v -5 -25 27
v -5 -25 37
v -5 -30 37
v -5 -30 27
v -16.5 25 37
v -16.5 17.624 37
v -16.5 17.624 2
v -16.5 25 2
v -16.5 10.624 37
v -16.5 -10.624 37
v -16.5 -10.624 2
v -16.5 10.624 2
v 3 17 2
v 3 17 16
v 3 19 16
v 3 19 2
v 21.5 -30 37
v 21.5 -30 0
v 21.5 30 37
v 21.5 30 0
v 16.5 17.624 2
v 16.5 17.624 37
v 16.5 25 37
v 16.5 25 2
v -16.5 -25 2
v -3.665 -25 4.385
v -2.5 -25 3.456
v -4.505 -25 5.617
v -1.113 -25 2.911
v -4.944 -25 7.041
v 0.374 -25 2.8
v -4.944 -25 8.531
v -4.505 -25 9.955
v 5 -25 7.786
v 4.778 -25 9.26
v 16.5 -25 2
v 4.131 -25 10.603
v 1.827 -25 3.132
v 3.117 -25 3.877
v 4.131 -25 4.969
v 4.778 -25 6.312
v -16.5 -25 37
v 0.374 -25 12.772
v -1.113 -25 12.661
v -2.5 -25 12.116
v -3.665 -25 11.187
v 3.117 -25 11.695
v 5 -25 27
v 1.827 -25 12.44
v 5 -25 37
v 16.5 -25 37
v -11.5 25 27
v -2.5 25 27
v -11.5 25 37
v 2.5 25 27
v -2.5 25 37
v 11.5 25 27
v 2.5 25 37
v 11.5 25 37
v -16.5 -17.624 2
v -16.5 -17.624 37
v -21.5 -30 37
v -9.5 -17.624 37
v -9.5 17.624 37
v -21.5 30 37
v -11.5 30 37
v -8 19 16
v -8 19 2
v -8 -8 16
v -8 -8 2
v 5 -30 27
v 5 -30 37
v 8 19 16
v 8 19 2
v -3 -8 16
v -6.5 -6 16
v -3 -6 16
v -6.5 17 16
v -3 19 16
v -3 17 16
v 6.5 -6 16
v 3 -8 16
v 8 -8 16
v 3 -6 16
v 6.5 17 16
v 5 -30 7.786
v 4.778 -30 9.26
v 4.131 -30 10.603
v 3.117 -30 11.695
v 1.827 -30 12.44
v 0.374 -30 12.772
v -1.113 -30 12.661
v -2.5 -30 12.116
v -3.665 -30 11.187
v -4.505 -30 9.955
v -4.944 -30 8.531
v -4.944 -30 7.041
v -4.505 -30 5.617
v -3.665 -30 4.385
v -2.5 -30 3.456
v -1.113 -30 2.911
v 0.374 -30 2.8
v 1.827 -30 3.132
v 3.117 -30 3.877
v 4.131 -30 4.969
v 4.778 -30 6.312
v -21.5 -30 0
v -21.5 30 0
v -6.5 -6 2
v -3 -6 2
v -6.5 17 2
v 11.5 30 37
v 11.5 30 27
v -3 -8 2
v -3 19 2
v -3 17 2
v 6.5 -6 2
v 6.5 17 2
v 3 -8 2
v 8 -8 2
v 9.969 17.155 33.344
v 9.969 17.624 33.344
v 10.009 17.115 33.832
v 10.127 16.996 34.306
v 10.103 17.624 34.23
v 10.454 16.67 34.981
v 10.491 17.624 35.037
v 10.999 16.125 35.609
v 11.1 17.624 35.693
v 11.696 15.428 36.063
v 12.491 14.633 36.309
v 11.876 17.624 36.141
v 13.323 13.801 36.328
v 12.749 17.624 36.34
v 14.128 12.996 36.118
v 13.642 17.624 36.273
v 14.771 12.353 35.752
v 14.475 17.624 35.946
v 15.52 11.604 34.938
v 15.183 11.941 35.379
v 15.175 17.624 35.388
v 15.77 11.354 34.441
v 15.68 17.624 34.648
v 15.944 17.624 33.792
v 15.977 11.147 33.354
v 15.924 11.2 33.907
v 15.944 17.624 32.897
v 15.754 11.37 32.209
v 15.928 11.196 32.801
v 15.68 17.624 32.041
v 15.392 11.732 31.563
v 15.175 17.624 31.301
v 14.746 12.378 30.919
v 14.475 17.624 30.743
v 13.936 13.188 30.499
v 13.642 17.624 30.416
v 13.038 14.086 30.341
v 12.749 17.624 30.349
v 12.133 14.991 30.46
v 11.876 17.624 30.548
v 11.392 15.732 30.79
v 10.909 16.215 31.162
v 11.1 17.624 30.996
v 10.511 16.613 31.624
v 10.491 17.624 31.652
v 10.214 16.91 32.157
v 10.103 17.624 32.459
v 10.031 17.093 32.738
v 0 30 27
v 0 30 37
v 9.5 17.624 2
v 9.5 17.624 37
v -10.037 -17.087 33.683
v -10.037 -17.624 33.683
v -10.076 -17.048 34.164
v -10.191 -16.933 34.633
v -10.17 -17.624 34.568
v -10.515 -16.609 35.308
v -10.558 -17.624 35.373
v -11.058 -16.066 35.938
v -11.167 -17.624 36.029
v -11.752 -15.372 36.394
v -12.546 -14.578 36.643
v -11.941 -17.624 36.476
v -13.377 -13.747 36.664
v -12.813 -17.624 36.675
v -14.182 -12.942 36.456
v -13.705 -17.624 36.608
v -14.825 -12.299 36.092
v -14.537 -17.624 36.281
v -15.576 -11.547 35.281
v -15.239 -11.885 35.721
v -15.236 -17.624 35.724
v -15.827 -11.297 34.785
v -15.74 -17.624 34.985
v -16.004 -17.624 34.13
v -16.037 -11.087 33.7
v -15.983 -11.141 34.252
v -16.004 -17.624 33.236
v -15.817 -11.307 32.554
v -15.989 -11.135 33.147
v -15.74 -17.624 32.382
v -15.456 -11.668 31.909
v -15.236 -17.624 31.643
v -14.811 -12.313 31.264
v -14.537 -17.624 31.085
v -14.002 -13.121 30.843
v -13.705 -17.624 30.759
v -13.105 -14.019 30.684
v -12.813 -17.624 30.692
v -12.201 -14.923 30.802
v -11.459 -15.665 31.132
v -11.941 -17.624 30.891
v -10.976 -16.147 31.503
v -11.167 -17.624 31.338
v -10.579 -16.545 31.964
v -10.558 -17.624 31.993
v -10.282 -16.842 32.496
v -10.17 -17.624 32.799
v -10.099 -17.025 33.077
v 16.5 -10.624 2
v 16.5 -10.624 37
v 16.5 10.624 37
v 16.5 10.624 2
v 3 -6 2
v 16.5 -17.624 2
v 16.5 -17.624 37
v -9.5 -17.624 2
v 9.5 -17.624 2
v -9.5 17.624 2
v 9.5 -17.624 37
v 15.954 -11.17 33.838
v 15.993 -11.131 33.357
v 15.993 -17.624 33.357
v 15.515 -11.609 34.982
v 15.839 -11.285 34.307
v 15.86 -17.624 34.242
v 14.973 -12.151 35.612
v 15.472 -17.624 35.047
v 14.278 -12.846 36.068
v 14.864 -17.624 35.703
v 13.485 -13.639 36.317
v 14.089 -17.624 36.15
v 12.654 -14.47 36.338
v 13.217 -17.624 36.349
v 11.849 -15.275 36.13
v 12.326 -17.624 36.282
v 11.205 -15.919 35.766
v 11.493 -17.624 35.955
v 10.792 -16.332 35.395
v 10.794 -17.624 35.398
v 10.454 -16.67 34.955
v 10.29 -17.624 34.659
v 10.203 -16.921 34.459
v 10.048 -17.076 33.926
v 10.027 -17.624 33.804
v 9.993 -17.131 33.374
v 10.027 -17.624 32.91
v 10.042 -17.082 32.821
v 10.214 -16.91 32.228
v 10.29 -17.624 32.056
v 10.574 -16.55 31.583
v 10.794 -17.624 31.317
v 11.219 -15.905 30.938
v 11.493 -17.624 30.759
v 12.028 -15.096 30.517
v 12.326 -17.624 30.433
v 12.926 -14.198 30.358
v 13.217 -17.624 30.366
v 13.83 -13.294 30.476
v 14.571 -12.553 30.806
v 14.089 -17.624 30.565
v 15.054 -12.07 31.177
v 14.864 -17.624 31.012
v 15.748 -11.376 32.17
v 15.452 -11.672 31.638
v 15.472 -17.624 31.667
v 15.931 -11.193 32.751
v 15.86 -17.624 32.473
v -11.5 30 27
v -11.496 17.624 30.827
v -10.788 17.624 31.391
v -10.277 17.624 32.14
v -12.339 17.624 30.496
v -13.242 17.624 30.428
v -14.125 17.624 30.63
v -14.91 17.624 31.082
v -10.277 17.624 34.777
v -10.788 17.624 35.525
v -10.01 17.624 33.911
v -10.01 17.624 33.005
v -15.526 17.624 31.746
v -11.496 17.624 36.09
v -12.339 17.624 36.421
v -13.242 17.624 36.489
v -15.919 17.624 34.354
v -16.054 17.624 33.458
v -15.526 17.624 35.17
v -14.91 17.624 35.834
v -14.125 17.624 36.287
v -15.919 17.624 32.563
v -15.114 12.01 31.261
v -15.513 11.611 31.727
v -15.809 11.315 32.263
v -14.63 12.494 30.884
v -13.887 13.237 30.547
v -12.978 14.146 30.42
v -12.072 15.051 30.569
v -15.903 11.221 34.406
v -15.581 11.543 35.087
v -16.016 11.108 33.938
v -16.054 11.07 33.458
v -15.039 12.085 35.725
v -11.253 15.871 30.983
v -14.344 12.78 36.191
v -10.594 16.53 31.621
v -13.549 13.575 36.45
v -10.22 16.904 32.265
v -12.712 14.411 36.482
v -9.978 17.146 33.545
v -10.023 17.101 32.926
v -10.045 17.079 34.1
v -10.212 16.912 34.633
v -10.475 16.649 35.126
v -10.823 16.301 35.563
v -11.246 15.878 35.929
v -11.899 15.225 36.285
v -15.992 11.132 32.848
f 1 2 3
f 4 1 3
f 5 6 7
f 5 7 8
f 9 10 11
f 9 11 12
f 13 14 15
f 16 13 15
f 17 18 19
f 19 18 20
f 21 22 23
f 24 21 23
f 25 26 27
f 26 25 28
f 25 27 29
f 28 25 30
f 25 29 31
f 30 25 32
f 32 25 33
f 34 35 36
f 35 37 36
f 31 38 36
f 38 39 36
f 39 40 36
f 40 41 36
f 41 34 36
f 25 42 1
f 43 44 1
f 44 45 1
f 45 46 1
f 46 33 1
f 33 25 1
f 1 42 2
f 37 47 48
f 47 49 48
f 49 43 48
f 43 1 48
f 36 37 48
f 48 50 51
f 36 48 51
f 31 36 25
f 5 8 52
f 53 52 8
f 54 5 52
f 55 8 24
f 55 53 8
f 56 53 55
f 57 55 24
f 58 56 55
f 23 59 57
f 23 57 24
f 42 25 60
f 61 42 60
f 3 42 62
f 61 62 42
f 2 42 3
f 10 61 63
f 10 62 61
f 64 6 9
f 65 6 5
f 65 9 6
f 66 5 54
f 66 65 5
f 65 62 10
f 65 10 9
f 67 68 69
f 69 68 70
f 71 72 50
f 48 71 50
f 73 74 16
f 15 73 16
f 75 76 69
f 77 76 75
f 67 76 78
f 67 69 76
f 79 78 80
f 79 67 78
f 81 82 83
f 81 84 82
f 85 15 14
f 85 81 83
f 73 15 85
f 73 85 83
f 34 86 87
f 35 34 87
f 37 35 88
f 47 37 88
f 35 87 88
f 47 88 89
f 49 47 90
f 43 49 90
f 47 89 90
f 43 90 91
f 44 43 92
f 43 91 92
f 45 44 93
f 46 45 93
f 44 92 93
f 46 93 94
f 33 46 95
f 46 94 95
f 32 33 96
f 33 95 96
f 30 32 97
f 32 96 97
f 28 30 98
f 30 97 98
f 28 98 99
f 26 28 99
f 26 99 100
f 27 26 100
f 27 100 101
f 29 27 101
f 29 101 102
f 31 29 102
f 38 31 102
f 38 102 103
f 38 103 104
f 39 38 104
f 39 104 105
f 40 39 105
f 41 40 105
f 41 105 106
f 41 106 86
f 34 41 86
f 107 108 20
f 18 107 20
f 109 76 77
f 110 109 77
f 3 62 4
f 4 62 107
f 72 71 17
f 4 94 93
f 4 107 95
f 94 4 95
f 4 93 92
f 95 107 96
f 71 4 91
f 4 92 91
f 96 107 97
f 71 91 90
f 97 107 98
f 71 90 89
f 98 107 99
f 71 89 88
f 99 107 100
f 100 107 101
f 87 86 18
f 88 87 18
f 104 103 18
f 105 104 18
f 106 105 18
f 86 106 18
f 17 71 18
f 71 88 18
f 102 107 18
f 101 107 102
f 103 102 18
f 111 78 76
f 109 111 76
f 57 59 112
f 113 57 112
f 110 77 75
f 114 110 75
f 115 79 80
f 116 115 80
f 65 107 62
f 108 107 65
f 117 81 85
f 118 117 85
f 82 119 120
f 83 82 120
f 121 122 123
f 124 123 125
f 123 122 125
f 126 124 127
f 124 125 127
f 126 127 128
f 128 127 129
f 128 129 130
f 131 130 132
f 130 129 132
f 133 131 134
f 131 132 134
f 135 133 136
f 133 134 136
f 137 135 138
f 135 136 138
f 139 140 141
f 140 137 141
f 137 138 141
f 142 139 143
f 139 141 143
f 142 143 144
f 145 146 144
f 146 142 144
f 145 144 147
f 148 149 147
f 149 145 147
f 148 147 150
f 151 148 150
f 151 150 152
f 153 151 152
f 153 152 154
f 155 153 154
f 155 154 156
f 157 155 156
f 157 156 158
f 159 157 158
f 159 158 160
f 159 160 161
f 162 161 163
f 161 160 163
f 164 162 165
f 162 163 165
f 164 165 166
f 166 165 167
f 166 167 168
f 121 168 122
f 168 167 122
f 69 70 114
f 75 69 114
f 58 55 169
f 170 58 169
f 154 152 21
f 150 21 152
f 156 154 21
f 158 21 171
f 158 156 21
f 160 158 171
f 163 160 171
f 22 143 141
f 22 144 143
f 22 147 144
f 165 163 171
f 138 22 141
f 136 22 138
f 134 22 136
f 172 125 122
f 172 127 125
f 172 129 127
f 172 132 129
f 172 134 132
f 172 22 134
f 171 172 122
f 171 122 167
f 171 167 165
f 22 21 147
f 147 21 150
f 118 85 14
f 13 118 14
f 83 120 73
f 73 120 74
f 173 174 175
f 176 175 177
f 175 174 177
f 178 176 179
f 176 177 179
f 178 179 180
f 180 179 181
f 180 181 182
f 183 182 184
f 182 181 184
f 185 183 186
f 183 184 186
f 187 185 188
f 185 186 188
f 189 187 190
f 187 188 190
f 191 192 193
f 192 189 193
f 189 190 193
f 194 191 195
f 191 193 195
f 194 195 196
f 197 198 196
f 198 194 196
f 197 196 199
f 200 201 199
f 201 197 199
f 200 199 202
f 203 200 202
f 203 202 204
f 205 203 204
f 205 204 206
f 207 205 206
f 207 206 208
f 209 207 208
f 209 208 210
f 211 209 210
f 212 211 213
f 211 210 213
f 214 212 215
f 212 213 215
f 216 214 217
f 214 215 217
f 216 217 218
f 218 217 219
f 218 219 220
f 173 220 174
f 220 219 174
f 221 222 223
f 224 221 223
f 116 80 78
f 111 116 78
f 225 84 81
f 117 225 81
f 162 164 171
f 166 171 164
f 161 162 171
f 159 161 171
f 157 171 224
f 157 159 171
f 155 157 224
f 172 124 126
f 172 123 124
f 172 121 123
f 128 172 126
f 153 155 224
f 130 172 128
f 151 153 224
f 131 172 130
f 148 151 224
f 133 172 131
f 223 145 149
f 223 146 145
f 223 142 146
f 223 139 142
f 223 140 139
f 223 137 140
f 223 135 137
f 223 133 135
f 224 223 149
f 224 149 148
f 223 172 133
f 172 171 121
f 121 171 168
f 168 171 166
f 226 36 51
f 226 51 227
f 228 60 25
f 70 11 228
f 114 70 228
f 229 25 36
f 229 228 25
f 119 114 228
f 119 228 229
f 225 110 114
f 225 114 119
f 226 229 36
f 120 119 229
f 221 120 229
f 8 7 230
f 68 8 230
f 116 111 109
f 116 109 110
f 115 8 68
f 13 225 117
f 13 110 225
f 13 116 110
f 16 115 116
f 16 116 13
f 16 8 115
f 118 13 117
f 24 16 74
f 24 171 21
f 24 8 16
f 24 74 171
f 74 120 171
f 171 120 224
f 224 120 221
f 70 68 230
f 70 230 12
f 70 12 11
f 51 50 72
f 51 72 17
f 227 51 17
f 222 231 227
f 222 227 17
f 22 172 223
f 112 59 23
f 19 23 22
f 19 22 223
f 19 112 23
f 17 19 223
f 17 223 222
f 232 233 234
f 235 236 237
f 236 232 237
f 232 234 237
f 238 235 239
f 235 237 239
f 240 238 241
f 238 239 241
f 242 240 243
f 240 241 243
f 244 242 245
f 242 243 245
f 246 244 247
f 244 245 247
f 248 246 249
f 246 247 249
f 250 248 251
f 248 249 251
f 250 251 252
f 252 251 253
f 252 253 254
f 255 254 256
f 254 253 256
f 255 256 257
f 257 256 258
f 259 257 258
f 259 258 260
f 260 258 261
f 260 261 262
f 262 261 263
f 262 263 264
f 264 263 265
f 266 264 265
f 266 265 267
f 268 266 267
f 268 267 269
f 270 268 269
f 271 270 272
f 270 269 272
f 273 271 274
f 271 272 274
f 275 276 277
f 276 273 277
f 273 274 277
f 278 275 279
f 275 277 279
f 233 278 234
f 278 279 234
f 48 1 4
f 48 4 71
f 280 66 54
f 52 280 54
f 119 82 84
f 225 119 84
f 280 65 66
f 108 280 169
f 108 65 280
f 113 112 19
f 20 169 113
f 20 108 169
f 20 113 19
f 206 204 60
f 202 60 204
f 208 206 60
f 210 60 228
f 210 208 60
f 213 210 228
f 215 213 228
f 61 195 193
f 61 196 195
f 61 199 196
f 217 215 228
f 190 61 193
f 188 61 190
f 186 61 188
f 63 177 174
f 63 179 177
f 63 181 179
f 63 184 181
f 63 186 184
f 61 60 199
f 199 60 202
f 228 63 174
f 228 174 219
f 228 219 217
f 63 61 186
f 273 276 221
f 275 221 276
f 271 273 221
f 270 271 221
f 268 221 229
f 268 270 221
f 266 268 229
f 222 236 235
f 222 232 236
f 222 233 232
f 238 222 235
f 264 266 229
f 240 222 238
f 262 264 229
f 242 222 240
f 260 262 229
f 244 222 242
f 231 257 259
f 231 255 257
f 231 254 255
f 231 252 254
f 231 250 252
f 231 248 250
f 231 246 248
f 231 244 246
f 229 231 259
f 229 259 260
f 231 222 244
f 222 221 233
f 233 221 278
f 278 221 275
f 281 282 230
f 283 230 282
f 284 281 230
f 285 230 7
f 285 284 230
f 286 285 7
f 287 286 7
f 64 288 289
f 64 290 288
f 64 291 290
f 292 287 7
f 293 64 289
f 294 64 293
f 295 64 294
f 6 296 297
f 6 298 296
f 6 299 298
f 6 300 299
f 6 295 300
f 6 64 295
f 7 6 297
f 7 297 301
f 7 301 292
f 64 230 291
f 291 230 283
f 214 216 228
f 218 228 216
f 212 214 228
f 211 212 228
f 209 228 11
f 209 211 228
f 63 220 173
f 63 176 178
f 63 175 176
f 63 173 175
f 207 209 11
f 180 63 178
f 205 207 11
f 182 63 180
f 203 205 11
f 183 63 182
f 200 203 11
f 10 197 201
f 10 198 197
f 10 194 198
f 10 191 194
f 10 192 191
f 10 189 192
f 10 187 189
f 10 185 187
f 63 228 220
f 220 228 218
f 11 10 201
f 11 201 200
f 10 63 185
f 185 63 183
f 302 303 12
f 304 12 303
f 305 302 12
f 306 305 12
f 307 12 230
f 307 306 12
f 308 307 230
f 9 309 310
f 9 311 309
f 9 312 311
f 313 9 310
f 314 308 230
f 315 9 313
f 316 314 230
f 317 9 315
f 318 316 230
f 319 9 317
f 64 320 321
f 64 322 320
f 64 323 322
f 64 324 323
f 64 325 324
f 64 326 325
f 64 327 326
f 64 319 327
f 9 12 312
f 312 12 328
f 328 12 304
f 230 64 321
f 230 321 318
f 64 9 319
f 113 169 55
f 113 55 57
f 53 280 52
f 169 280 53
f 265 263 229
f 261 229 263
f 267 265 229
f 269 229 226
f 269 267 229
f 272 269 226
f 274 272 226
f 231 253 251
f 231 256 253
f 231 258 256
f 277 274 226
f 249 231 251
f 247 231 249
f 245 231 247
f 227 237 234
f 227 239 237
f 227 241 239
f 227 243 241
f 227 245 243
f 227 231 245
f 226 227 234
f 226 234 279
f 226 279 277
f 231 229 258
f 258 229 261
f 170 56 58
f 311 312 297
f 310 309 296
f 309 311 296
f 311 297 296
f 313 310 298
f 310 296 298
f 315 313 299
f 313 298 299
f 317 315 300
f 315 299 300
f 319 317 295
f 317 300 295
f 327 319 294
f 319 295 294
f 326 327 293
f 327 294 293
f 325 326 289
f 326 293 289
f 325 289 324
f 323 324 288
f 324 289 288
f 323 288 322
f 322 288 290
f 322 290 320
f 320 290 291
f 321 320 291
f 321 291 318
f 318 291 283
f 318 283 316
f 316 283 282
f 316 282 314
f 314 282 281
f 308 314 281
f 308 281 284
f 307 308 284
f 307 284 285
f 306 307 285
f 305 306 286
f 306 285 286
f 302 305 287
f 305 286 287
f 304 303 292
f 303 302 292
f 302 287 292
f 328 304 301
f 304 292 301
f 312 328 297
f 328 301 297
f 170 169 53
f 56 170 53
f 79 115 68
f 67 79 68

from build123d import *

# Parameters (mm, degrees)
F0_W      = 43
F0_H      = 60
F1_DEPTH  = 37
F2_W      = 33
F2_H      = 50
F3_DEPTH  = 35
F5_DEPTH  = 10
F7_DEPTH  = 10
F9_DEPTH  = 10
F12_DEPTH = 14
F14_DEPTH = 14
F16_DEPTH = 14
F18_DEPTH = 14
F19_R     = 5
F20_DEPTH = 6
F22_DEPTH = 33
F23_DEPTH = 33
F24_DEPTH = 33
F25_DEPTH = 33
F26_R     = 3.000008
F27_DEPTH = 15
F28_R     = 3.025892
F29_DEPTH = 15
F30_R     = 3
F31_DEPTH = 15
F32_R     = 3
F33_DEPTH = 15
F34_DEPTH = 35
F35_R     = 3
F36_DEPTH = 10
F37_R     = 3.000007
F38_DEPTH = 10
F39_R     = 3.004044
F40_DEPTH = 10
F41_R     = 3.03892
F42_DEPTH = 10


with BuildPart() as f1:
    # F0 (on Top) → F1 (new body)
    with BuildSketch(Plane.XY):
        Rectangle(F0_W, F0_H)
    extrude(amount=F1_DEPTH)

    # F2 (on face) → F3 (cut)
    with BuildSketch(Plane.XY.offset(37)):
        Rectangle(F2_W, F2_H)
    extrude(amount=-F3_DEPTH, mode=Mode.SUBTRACT)

    # F4 (on face) → F5 (cut)
    with BuildSketch(Plane.XY.offset(37)):
        Polygon((11.5, 30), (0, 30), (-11.5, 30), (-11.5, 25), (0, 25), (11.5, 25), align=None)
    extrude(amount=-F5_DEPTH, mode=Mode.SUBTRACT)

    # F6 (on face) → F7 (join)
    with BuildSketch(Plane.XY.offset(27)):
        Polygon((2.5, 25), (0, 30), (-2.5, 25), (0, 25), align=None)
    extrude(amount=F7_DEPTH)

    # F8 (on face) → F9 (cut)
    with BuildSketch(Plane.XY.offset(37)):
        Polygon((5, -25), (0, -25), (-5, -25), (-5, -30), (0, -30), (5, -30), align=None)
    extrude(amount=-F9_DEPTH, mode=Mode.SUBTRACT)

    # F11 (on face) → F12 (join)
    with BuildSketch(Plane.XY.offset(2)):
        Polygon((8, 19), (0, 19), (-8, 19), (-8, 0), (-8, -8), (0, -8), (8, -8), (8, 0), align=None)
    extrude(amount=F12_DEPTH)

    # F13 (on face) → F14 (cut)
    with BuildSketch(Plane.XY.offset(16)):
        Polygon((6.5, 17), (0, 17), (-6.5, 17), (-6.5, 0), (-6.5, -6), (0, -6), (6.5, -6), (6.5, 0), align=None)
    extrude(amount=-F14_DEPTH, mode=Mode.SUBTRACT)

    # F15 (on face) → F16 (cut)
    with BuildSketch(Plane.XY.offset(16)):
        Polygon((3, 19), (0, 19), (-3, 19), (-3, 17), (0, 17), (3, 17), align=None)
    extrude(amount=-F16_DEPTH, mode=Mode.SUBTRACT)

    # F17 (on face) → F18 (cut)
    with BuildSketch(Plane.XY.offset(16)):
        Polygon((3, -6), (0, -6), (-3, -6), (-3, -8), (0, -8), (3, -8), align=None)
    extrude(amount=-F18_DEPTH, mode=Mode.SUBTRACT)

    # F19 (on face) → F20 (cut)
    with BuildSketch(Plane.XZ.offset(30)):
        with Locations((0, 7.785951)):
            Circle(F19_R)
    extrude(amount=-F20_DEPTH, mode=Mode.SUBTRACT)

    # F21 (on face) → F22 (join)
    with BuildSketch(Plane.XY.offset(37)):
        Polygon((-16.5, -10.623924), (-16.5, -17.623924), (-9.5, -17.623924), align=None)
    extrude(amount=-F22_DEPTH)

    # F21 (on face) → F23 (join)
    with BuildSketch(Plane.XY.offset(37)):
        Polygon((16.5, -17.623924), (16.5, -10.623924), (9.5, -17.623924), align=None)
    extrude(amount=-F23_DEPTH)

    # F21 (on face) → F24 (join)
    with BuildSketch(Plane.XY.offset(37)):
        Polygon((-9.5, 17.623924), (-16.5, 17.623924), (-16.5, 10.623924), align=None)
    extrude(amount=-F24_DEPTH)

    # F21 (on face) → F25 (join)
    with BuildSketch(Plane.XY.offset(37)):
        Polygon((9.5, 17.623924), (16.5, 10.623924), (16.5, 17.623924), align=None)
    extrude(amount=-F25_DEPTH)

    # F26 (on face) → F27 (cut)
    with BuildSketch(Plane.XZ.offset(17.623924)):
        with Locations((-13.006919, 32.922085)):
            Circle(F26_R)
    extrude(amount=-F27_DEPTH, mode=Mode.SUBTRACT)

    # F28 (on face) → F29 (cut)
    with BuildSketch(Plane.XZ.offset(17.623924)):
        with Locations((13.051108, 32.73694)):
            Circle(F28_R)
    extrude(amount=-F29_DEPTH, mode=Mode.SUBTRACT)

    # F30 (on face) → F31 (cut)
    with BuildSketch(Plane(origin=(0, 17.623924, 0), x_dir=(-1, 0, 0), z_dir=(0, 1, 0))):
        with Locations((-12.977869, 32.83175)):
            Circle(F30_R)
    extrude(amount=-F31_DEPTH, mode=Mode.SUBTRACT)

    # F32 (on face) → F33 (cut)
    with BuildSketch(Plane(origin=(0, 17.623924, 0), x_dir=(-1, 0, 0), z_dir=(0, 1, 0))):
        with Locations((13.297083, 33.348583)):
            Circle(F32_R)
    extrude(amount=-F33_DEPTH, mode=Mode.SUBTRACT)

    # F21 (on face) → F34 (join)
    with BuildSketch(Plane.XY.offset(37)):
        Polygon((-16.5, -10.623924), (-16.5, -17.623924), (-9.5, -17.623924), align=None)
        Polygon((16.5, -17.623924), (16.5, -10.623924), (9.5, -17.623924), align=None)
        Polygon((-9.5, 17.623924), (-16.5, 17.623924), (-16.5, 10.623924), align=None)
        Polygon((9.5, 17.623924), (16.5, 10.623924), (16.5, 17.623924), align=None)
    extrude(amount=-F34_DEPTH)

    # F35 (on face) → F36 (cut)
    with BuildSketch(Plane.XZ.offset(17.623924)):
        with Locations((-13.037096, 33.683364)):
            Circle(F35_R)
    extrude(amount=-F36_DEPTH, mode=Mode.SUBTRACT)

    # F37 (on face) → F38 (cut)
    with BuildSketch(Plane.XZ.offset(17.623924)):
        with Locations((12.993197, 33.357316)):
            Circle(F37_R)
    extrude(amount=-F38_DEPTH, mode=Mode.SUBTRACT)

    # F39 (on face) → F40 (cut)
    with BuildSketch(Plane(origin=(0, 17.623924, 0), x_dir=(-1, 0, 0), z_dir=(0, 1, 0))):
        with Locations((-12.973316, 33.344424)):
            Circle(F39_R)
    extrude(amount=-F40_DEPTH, mode=Mode.SUBTRACT)

    # F41 (on face) → F42 (cut)
    with BuildSketch(Plane(origin=(0, 17.623924, 0), x_dir=(-1, 0, 0), z_dir=(0, 1, 0))):
        with Locations((13.015212, 33.45837)):
            Circle(F41_R)
    extrude(amount=-F42_DEPTH, mode=Mode.SUBTRACT)


solid = f1.part
